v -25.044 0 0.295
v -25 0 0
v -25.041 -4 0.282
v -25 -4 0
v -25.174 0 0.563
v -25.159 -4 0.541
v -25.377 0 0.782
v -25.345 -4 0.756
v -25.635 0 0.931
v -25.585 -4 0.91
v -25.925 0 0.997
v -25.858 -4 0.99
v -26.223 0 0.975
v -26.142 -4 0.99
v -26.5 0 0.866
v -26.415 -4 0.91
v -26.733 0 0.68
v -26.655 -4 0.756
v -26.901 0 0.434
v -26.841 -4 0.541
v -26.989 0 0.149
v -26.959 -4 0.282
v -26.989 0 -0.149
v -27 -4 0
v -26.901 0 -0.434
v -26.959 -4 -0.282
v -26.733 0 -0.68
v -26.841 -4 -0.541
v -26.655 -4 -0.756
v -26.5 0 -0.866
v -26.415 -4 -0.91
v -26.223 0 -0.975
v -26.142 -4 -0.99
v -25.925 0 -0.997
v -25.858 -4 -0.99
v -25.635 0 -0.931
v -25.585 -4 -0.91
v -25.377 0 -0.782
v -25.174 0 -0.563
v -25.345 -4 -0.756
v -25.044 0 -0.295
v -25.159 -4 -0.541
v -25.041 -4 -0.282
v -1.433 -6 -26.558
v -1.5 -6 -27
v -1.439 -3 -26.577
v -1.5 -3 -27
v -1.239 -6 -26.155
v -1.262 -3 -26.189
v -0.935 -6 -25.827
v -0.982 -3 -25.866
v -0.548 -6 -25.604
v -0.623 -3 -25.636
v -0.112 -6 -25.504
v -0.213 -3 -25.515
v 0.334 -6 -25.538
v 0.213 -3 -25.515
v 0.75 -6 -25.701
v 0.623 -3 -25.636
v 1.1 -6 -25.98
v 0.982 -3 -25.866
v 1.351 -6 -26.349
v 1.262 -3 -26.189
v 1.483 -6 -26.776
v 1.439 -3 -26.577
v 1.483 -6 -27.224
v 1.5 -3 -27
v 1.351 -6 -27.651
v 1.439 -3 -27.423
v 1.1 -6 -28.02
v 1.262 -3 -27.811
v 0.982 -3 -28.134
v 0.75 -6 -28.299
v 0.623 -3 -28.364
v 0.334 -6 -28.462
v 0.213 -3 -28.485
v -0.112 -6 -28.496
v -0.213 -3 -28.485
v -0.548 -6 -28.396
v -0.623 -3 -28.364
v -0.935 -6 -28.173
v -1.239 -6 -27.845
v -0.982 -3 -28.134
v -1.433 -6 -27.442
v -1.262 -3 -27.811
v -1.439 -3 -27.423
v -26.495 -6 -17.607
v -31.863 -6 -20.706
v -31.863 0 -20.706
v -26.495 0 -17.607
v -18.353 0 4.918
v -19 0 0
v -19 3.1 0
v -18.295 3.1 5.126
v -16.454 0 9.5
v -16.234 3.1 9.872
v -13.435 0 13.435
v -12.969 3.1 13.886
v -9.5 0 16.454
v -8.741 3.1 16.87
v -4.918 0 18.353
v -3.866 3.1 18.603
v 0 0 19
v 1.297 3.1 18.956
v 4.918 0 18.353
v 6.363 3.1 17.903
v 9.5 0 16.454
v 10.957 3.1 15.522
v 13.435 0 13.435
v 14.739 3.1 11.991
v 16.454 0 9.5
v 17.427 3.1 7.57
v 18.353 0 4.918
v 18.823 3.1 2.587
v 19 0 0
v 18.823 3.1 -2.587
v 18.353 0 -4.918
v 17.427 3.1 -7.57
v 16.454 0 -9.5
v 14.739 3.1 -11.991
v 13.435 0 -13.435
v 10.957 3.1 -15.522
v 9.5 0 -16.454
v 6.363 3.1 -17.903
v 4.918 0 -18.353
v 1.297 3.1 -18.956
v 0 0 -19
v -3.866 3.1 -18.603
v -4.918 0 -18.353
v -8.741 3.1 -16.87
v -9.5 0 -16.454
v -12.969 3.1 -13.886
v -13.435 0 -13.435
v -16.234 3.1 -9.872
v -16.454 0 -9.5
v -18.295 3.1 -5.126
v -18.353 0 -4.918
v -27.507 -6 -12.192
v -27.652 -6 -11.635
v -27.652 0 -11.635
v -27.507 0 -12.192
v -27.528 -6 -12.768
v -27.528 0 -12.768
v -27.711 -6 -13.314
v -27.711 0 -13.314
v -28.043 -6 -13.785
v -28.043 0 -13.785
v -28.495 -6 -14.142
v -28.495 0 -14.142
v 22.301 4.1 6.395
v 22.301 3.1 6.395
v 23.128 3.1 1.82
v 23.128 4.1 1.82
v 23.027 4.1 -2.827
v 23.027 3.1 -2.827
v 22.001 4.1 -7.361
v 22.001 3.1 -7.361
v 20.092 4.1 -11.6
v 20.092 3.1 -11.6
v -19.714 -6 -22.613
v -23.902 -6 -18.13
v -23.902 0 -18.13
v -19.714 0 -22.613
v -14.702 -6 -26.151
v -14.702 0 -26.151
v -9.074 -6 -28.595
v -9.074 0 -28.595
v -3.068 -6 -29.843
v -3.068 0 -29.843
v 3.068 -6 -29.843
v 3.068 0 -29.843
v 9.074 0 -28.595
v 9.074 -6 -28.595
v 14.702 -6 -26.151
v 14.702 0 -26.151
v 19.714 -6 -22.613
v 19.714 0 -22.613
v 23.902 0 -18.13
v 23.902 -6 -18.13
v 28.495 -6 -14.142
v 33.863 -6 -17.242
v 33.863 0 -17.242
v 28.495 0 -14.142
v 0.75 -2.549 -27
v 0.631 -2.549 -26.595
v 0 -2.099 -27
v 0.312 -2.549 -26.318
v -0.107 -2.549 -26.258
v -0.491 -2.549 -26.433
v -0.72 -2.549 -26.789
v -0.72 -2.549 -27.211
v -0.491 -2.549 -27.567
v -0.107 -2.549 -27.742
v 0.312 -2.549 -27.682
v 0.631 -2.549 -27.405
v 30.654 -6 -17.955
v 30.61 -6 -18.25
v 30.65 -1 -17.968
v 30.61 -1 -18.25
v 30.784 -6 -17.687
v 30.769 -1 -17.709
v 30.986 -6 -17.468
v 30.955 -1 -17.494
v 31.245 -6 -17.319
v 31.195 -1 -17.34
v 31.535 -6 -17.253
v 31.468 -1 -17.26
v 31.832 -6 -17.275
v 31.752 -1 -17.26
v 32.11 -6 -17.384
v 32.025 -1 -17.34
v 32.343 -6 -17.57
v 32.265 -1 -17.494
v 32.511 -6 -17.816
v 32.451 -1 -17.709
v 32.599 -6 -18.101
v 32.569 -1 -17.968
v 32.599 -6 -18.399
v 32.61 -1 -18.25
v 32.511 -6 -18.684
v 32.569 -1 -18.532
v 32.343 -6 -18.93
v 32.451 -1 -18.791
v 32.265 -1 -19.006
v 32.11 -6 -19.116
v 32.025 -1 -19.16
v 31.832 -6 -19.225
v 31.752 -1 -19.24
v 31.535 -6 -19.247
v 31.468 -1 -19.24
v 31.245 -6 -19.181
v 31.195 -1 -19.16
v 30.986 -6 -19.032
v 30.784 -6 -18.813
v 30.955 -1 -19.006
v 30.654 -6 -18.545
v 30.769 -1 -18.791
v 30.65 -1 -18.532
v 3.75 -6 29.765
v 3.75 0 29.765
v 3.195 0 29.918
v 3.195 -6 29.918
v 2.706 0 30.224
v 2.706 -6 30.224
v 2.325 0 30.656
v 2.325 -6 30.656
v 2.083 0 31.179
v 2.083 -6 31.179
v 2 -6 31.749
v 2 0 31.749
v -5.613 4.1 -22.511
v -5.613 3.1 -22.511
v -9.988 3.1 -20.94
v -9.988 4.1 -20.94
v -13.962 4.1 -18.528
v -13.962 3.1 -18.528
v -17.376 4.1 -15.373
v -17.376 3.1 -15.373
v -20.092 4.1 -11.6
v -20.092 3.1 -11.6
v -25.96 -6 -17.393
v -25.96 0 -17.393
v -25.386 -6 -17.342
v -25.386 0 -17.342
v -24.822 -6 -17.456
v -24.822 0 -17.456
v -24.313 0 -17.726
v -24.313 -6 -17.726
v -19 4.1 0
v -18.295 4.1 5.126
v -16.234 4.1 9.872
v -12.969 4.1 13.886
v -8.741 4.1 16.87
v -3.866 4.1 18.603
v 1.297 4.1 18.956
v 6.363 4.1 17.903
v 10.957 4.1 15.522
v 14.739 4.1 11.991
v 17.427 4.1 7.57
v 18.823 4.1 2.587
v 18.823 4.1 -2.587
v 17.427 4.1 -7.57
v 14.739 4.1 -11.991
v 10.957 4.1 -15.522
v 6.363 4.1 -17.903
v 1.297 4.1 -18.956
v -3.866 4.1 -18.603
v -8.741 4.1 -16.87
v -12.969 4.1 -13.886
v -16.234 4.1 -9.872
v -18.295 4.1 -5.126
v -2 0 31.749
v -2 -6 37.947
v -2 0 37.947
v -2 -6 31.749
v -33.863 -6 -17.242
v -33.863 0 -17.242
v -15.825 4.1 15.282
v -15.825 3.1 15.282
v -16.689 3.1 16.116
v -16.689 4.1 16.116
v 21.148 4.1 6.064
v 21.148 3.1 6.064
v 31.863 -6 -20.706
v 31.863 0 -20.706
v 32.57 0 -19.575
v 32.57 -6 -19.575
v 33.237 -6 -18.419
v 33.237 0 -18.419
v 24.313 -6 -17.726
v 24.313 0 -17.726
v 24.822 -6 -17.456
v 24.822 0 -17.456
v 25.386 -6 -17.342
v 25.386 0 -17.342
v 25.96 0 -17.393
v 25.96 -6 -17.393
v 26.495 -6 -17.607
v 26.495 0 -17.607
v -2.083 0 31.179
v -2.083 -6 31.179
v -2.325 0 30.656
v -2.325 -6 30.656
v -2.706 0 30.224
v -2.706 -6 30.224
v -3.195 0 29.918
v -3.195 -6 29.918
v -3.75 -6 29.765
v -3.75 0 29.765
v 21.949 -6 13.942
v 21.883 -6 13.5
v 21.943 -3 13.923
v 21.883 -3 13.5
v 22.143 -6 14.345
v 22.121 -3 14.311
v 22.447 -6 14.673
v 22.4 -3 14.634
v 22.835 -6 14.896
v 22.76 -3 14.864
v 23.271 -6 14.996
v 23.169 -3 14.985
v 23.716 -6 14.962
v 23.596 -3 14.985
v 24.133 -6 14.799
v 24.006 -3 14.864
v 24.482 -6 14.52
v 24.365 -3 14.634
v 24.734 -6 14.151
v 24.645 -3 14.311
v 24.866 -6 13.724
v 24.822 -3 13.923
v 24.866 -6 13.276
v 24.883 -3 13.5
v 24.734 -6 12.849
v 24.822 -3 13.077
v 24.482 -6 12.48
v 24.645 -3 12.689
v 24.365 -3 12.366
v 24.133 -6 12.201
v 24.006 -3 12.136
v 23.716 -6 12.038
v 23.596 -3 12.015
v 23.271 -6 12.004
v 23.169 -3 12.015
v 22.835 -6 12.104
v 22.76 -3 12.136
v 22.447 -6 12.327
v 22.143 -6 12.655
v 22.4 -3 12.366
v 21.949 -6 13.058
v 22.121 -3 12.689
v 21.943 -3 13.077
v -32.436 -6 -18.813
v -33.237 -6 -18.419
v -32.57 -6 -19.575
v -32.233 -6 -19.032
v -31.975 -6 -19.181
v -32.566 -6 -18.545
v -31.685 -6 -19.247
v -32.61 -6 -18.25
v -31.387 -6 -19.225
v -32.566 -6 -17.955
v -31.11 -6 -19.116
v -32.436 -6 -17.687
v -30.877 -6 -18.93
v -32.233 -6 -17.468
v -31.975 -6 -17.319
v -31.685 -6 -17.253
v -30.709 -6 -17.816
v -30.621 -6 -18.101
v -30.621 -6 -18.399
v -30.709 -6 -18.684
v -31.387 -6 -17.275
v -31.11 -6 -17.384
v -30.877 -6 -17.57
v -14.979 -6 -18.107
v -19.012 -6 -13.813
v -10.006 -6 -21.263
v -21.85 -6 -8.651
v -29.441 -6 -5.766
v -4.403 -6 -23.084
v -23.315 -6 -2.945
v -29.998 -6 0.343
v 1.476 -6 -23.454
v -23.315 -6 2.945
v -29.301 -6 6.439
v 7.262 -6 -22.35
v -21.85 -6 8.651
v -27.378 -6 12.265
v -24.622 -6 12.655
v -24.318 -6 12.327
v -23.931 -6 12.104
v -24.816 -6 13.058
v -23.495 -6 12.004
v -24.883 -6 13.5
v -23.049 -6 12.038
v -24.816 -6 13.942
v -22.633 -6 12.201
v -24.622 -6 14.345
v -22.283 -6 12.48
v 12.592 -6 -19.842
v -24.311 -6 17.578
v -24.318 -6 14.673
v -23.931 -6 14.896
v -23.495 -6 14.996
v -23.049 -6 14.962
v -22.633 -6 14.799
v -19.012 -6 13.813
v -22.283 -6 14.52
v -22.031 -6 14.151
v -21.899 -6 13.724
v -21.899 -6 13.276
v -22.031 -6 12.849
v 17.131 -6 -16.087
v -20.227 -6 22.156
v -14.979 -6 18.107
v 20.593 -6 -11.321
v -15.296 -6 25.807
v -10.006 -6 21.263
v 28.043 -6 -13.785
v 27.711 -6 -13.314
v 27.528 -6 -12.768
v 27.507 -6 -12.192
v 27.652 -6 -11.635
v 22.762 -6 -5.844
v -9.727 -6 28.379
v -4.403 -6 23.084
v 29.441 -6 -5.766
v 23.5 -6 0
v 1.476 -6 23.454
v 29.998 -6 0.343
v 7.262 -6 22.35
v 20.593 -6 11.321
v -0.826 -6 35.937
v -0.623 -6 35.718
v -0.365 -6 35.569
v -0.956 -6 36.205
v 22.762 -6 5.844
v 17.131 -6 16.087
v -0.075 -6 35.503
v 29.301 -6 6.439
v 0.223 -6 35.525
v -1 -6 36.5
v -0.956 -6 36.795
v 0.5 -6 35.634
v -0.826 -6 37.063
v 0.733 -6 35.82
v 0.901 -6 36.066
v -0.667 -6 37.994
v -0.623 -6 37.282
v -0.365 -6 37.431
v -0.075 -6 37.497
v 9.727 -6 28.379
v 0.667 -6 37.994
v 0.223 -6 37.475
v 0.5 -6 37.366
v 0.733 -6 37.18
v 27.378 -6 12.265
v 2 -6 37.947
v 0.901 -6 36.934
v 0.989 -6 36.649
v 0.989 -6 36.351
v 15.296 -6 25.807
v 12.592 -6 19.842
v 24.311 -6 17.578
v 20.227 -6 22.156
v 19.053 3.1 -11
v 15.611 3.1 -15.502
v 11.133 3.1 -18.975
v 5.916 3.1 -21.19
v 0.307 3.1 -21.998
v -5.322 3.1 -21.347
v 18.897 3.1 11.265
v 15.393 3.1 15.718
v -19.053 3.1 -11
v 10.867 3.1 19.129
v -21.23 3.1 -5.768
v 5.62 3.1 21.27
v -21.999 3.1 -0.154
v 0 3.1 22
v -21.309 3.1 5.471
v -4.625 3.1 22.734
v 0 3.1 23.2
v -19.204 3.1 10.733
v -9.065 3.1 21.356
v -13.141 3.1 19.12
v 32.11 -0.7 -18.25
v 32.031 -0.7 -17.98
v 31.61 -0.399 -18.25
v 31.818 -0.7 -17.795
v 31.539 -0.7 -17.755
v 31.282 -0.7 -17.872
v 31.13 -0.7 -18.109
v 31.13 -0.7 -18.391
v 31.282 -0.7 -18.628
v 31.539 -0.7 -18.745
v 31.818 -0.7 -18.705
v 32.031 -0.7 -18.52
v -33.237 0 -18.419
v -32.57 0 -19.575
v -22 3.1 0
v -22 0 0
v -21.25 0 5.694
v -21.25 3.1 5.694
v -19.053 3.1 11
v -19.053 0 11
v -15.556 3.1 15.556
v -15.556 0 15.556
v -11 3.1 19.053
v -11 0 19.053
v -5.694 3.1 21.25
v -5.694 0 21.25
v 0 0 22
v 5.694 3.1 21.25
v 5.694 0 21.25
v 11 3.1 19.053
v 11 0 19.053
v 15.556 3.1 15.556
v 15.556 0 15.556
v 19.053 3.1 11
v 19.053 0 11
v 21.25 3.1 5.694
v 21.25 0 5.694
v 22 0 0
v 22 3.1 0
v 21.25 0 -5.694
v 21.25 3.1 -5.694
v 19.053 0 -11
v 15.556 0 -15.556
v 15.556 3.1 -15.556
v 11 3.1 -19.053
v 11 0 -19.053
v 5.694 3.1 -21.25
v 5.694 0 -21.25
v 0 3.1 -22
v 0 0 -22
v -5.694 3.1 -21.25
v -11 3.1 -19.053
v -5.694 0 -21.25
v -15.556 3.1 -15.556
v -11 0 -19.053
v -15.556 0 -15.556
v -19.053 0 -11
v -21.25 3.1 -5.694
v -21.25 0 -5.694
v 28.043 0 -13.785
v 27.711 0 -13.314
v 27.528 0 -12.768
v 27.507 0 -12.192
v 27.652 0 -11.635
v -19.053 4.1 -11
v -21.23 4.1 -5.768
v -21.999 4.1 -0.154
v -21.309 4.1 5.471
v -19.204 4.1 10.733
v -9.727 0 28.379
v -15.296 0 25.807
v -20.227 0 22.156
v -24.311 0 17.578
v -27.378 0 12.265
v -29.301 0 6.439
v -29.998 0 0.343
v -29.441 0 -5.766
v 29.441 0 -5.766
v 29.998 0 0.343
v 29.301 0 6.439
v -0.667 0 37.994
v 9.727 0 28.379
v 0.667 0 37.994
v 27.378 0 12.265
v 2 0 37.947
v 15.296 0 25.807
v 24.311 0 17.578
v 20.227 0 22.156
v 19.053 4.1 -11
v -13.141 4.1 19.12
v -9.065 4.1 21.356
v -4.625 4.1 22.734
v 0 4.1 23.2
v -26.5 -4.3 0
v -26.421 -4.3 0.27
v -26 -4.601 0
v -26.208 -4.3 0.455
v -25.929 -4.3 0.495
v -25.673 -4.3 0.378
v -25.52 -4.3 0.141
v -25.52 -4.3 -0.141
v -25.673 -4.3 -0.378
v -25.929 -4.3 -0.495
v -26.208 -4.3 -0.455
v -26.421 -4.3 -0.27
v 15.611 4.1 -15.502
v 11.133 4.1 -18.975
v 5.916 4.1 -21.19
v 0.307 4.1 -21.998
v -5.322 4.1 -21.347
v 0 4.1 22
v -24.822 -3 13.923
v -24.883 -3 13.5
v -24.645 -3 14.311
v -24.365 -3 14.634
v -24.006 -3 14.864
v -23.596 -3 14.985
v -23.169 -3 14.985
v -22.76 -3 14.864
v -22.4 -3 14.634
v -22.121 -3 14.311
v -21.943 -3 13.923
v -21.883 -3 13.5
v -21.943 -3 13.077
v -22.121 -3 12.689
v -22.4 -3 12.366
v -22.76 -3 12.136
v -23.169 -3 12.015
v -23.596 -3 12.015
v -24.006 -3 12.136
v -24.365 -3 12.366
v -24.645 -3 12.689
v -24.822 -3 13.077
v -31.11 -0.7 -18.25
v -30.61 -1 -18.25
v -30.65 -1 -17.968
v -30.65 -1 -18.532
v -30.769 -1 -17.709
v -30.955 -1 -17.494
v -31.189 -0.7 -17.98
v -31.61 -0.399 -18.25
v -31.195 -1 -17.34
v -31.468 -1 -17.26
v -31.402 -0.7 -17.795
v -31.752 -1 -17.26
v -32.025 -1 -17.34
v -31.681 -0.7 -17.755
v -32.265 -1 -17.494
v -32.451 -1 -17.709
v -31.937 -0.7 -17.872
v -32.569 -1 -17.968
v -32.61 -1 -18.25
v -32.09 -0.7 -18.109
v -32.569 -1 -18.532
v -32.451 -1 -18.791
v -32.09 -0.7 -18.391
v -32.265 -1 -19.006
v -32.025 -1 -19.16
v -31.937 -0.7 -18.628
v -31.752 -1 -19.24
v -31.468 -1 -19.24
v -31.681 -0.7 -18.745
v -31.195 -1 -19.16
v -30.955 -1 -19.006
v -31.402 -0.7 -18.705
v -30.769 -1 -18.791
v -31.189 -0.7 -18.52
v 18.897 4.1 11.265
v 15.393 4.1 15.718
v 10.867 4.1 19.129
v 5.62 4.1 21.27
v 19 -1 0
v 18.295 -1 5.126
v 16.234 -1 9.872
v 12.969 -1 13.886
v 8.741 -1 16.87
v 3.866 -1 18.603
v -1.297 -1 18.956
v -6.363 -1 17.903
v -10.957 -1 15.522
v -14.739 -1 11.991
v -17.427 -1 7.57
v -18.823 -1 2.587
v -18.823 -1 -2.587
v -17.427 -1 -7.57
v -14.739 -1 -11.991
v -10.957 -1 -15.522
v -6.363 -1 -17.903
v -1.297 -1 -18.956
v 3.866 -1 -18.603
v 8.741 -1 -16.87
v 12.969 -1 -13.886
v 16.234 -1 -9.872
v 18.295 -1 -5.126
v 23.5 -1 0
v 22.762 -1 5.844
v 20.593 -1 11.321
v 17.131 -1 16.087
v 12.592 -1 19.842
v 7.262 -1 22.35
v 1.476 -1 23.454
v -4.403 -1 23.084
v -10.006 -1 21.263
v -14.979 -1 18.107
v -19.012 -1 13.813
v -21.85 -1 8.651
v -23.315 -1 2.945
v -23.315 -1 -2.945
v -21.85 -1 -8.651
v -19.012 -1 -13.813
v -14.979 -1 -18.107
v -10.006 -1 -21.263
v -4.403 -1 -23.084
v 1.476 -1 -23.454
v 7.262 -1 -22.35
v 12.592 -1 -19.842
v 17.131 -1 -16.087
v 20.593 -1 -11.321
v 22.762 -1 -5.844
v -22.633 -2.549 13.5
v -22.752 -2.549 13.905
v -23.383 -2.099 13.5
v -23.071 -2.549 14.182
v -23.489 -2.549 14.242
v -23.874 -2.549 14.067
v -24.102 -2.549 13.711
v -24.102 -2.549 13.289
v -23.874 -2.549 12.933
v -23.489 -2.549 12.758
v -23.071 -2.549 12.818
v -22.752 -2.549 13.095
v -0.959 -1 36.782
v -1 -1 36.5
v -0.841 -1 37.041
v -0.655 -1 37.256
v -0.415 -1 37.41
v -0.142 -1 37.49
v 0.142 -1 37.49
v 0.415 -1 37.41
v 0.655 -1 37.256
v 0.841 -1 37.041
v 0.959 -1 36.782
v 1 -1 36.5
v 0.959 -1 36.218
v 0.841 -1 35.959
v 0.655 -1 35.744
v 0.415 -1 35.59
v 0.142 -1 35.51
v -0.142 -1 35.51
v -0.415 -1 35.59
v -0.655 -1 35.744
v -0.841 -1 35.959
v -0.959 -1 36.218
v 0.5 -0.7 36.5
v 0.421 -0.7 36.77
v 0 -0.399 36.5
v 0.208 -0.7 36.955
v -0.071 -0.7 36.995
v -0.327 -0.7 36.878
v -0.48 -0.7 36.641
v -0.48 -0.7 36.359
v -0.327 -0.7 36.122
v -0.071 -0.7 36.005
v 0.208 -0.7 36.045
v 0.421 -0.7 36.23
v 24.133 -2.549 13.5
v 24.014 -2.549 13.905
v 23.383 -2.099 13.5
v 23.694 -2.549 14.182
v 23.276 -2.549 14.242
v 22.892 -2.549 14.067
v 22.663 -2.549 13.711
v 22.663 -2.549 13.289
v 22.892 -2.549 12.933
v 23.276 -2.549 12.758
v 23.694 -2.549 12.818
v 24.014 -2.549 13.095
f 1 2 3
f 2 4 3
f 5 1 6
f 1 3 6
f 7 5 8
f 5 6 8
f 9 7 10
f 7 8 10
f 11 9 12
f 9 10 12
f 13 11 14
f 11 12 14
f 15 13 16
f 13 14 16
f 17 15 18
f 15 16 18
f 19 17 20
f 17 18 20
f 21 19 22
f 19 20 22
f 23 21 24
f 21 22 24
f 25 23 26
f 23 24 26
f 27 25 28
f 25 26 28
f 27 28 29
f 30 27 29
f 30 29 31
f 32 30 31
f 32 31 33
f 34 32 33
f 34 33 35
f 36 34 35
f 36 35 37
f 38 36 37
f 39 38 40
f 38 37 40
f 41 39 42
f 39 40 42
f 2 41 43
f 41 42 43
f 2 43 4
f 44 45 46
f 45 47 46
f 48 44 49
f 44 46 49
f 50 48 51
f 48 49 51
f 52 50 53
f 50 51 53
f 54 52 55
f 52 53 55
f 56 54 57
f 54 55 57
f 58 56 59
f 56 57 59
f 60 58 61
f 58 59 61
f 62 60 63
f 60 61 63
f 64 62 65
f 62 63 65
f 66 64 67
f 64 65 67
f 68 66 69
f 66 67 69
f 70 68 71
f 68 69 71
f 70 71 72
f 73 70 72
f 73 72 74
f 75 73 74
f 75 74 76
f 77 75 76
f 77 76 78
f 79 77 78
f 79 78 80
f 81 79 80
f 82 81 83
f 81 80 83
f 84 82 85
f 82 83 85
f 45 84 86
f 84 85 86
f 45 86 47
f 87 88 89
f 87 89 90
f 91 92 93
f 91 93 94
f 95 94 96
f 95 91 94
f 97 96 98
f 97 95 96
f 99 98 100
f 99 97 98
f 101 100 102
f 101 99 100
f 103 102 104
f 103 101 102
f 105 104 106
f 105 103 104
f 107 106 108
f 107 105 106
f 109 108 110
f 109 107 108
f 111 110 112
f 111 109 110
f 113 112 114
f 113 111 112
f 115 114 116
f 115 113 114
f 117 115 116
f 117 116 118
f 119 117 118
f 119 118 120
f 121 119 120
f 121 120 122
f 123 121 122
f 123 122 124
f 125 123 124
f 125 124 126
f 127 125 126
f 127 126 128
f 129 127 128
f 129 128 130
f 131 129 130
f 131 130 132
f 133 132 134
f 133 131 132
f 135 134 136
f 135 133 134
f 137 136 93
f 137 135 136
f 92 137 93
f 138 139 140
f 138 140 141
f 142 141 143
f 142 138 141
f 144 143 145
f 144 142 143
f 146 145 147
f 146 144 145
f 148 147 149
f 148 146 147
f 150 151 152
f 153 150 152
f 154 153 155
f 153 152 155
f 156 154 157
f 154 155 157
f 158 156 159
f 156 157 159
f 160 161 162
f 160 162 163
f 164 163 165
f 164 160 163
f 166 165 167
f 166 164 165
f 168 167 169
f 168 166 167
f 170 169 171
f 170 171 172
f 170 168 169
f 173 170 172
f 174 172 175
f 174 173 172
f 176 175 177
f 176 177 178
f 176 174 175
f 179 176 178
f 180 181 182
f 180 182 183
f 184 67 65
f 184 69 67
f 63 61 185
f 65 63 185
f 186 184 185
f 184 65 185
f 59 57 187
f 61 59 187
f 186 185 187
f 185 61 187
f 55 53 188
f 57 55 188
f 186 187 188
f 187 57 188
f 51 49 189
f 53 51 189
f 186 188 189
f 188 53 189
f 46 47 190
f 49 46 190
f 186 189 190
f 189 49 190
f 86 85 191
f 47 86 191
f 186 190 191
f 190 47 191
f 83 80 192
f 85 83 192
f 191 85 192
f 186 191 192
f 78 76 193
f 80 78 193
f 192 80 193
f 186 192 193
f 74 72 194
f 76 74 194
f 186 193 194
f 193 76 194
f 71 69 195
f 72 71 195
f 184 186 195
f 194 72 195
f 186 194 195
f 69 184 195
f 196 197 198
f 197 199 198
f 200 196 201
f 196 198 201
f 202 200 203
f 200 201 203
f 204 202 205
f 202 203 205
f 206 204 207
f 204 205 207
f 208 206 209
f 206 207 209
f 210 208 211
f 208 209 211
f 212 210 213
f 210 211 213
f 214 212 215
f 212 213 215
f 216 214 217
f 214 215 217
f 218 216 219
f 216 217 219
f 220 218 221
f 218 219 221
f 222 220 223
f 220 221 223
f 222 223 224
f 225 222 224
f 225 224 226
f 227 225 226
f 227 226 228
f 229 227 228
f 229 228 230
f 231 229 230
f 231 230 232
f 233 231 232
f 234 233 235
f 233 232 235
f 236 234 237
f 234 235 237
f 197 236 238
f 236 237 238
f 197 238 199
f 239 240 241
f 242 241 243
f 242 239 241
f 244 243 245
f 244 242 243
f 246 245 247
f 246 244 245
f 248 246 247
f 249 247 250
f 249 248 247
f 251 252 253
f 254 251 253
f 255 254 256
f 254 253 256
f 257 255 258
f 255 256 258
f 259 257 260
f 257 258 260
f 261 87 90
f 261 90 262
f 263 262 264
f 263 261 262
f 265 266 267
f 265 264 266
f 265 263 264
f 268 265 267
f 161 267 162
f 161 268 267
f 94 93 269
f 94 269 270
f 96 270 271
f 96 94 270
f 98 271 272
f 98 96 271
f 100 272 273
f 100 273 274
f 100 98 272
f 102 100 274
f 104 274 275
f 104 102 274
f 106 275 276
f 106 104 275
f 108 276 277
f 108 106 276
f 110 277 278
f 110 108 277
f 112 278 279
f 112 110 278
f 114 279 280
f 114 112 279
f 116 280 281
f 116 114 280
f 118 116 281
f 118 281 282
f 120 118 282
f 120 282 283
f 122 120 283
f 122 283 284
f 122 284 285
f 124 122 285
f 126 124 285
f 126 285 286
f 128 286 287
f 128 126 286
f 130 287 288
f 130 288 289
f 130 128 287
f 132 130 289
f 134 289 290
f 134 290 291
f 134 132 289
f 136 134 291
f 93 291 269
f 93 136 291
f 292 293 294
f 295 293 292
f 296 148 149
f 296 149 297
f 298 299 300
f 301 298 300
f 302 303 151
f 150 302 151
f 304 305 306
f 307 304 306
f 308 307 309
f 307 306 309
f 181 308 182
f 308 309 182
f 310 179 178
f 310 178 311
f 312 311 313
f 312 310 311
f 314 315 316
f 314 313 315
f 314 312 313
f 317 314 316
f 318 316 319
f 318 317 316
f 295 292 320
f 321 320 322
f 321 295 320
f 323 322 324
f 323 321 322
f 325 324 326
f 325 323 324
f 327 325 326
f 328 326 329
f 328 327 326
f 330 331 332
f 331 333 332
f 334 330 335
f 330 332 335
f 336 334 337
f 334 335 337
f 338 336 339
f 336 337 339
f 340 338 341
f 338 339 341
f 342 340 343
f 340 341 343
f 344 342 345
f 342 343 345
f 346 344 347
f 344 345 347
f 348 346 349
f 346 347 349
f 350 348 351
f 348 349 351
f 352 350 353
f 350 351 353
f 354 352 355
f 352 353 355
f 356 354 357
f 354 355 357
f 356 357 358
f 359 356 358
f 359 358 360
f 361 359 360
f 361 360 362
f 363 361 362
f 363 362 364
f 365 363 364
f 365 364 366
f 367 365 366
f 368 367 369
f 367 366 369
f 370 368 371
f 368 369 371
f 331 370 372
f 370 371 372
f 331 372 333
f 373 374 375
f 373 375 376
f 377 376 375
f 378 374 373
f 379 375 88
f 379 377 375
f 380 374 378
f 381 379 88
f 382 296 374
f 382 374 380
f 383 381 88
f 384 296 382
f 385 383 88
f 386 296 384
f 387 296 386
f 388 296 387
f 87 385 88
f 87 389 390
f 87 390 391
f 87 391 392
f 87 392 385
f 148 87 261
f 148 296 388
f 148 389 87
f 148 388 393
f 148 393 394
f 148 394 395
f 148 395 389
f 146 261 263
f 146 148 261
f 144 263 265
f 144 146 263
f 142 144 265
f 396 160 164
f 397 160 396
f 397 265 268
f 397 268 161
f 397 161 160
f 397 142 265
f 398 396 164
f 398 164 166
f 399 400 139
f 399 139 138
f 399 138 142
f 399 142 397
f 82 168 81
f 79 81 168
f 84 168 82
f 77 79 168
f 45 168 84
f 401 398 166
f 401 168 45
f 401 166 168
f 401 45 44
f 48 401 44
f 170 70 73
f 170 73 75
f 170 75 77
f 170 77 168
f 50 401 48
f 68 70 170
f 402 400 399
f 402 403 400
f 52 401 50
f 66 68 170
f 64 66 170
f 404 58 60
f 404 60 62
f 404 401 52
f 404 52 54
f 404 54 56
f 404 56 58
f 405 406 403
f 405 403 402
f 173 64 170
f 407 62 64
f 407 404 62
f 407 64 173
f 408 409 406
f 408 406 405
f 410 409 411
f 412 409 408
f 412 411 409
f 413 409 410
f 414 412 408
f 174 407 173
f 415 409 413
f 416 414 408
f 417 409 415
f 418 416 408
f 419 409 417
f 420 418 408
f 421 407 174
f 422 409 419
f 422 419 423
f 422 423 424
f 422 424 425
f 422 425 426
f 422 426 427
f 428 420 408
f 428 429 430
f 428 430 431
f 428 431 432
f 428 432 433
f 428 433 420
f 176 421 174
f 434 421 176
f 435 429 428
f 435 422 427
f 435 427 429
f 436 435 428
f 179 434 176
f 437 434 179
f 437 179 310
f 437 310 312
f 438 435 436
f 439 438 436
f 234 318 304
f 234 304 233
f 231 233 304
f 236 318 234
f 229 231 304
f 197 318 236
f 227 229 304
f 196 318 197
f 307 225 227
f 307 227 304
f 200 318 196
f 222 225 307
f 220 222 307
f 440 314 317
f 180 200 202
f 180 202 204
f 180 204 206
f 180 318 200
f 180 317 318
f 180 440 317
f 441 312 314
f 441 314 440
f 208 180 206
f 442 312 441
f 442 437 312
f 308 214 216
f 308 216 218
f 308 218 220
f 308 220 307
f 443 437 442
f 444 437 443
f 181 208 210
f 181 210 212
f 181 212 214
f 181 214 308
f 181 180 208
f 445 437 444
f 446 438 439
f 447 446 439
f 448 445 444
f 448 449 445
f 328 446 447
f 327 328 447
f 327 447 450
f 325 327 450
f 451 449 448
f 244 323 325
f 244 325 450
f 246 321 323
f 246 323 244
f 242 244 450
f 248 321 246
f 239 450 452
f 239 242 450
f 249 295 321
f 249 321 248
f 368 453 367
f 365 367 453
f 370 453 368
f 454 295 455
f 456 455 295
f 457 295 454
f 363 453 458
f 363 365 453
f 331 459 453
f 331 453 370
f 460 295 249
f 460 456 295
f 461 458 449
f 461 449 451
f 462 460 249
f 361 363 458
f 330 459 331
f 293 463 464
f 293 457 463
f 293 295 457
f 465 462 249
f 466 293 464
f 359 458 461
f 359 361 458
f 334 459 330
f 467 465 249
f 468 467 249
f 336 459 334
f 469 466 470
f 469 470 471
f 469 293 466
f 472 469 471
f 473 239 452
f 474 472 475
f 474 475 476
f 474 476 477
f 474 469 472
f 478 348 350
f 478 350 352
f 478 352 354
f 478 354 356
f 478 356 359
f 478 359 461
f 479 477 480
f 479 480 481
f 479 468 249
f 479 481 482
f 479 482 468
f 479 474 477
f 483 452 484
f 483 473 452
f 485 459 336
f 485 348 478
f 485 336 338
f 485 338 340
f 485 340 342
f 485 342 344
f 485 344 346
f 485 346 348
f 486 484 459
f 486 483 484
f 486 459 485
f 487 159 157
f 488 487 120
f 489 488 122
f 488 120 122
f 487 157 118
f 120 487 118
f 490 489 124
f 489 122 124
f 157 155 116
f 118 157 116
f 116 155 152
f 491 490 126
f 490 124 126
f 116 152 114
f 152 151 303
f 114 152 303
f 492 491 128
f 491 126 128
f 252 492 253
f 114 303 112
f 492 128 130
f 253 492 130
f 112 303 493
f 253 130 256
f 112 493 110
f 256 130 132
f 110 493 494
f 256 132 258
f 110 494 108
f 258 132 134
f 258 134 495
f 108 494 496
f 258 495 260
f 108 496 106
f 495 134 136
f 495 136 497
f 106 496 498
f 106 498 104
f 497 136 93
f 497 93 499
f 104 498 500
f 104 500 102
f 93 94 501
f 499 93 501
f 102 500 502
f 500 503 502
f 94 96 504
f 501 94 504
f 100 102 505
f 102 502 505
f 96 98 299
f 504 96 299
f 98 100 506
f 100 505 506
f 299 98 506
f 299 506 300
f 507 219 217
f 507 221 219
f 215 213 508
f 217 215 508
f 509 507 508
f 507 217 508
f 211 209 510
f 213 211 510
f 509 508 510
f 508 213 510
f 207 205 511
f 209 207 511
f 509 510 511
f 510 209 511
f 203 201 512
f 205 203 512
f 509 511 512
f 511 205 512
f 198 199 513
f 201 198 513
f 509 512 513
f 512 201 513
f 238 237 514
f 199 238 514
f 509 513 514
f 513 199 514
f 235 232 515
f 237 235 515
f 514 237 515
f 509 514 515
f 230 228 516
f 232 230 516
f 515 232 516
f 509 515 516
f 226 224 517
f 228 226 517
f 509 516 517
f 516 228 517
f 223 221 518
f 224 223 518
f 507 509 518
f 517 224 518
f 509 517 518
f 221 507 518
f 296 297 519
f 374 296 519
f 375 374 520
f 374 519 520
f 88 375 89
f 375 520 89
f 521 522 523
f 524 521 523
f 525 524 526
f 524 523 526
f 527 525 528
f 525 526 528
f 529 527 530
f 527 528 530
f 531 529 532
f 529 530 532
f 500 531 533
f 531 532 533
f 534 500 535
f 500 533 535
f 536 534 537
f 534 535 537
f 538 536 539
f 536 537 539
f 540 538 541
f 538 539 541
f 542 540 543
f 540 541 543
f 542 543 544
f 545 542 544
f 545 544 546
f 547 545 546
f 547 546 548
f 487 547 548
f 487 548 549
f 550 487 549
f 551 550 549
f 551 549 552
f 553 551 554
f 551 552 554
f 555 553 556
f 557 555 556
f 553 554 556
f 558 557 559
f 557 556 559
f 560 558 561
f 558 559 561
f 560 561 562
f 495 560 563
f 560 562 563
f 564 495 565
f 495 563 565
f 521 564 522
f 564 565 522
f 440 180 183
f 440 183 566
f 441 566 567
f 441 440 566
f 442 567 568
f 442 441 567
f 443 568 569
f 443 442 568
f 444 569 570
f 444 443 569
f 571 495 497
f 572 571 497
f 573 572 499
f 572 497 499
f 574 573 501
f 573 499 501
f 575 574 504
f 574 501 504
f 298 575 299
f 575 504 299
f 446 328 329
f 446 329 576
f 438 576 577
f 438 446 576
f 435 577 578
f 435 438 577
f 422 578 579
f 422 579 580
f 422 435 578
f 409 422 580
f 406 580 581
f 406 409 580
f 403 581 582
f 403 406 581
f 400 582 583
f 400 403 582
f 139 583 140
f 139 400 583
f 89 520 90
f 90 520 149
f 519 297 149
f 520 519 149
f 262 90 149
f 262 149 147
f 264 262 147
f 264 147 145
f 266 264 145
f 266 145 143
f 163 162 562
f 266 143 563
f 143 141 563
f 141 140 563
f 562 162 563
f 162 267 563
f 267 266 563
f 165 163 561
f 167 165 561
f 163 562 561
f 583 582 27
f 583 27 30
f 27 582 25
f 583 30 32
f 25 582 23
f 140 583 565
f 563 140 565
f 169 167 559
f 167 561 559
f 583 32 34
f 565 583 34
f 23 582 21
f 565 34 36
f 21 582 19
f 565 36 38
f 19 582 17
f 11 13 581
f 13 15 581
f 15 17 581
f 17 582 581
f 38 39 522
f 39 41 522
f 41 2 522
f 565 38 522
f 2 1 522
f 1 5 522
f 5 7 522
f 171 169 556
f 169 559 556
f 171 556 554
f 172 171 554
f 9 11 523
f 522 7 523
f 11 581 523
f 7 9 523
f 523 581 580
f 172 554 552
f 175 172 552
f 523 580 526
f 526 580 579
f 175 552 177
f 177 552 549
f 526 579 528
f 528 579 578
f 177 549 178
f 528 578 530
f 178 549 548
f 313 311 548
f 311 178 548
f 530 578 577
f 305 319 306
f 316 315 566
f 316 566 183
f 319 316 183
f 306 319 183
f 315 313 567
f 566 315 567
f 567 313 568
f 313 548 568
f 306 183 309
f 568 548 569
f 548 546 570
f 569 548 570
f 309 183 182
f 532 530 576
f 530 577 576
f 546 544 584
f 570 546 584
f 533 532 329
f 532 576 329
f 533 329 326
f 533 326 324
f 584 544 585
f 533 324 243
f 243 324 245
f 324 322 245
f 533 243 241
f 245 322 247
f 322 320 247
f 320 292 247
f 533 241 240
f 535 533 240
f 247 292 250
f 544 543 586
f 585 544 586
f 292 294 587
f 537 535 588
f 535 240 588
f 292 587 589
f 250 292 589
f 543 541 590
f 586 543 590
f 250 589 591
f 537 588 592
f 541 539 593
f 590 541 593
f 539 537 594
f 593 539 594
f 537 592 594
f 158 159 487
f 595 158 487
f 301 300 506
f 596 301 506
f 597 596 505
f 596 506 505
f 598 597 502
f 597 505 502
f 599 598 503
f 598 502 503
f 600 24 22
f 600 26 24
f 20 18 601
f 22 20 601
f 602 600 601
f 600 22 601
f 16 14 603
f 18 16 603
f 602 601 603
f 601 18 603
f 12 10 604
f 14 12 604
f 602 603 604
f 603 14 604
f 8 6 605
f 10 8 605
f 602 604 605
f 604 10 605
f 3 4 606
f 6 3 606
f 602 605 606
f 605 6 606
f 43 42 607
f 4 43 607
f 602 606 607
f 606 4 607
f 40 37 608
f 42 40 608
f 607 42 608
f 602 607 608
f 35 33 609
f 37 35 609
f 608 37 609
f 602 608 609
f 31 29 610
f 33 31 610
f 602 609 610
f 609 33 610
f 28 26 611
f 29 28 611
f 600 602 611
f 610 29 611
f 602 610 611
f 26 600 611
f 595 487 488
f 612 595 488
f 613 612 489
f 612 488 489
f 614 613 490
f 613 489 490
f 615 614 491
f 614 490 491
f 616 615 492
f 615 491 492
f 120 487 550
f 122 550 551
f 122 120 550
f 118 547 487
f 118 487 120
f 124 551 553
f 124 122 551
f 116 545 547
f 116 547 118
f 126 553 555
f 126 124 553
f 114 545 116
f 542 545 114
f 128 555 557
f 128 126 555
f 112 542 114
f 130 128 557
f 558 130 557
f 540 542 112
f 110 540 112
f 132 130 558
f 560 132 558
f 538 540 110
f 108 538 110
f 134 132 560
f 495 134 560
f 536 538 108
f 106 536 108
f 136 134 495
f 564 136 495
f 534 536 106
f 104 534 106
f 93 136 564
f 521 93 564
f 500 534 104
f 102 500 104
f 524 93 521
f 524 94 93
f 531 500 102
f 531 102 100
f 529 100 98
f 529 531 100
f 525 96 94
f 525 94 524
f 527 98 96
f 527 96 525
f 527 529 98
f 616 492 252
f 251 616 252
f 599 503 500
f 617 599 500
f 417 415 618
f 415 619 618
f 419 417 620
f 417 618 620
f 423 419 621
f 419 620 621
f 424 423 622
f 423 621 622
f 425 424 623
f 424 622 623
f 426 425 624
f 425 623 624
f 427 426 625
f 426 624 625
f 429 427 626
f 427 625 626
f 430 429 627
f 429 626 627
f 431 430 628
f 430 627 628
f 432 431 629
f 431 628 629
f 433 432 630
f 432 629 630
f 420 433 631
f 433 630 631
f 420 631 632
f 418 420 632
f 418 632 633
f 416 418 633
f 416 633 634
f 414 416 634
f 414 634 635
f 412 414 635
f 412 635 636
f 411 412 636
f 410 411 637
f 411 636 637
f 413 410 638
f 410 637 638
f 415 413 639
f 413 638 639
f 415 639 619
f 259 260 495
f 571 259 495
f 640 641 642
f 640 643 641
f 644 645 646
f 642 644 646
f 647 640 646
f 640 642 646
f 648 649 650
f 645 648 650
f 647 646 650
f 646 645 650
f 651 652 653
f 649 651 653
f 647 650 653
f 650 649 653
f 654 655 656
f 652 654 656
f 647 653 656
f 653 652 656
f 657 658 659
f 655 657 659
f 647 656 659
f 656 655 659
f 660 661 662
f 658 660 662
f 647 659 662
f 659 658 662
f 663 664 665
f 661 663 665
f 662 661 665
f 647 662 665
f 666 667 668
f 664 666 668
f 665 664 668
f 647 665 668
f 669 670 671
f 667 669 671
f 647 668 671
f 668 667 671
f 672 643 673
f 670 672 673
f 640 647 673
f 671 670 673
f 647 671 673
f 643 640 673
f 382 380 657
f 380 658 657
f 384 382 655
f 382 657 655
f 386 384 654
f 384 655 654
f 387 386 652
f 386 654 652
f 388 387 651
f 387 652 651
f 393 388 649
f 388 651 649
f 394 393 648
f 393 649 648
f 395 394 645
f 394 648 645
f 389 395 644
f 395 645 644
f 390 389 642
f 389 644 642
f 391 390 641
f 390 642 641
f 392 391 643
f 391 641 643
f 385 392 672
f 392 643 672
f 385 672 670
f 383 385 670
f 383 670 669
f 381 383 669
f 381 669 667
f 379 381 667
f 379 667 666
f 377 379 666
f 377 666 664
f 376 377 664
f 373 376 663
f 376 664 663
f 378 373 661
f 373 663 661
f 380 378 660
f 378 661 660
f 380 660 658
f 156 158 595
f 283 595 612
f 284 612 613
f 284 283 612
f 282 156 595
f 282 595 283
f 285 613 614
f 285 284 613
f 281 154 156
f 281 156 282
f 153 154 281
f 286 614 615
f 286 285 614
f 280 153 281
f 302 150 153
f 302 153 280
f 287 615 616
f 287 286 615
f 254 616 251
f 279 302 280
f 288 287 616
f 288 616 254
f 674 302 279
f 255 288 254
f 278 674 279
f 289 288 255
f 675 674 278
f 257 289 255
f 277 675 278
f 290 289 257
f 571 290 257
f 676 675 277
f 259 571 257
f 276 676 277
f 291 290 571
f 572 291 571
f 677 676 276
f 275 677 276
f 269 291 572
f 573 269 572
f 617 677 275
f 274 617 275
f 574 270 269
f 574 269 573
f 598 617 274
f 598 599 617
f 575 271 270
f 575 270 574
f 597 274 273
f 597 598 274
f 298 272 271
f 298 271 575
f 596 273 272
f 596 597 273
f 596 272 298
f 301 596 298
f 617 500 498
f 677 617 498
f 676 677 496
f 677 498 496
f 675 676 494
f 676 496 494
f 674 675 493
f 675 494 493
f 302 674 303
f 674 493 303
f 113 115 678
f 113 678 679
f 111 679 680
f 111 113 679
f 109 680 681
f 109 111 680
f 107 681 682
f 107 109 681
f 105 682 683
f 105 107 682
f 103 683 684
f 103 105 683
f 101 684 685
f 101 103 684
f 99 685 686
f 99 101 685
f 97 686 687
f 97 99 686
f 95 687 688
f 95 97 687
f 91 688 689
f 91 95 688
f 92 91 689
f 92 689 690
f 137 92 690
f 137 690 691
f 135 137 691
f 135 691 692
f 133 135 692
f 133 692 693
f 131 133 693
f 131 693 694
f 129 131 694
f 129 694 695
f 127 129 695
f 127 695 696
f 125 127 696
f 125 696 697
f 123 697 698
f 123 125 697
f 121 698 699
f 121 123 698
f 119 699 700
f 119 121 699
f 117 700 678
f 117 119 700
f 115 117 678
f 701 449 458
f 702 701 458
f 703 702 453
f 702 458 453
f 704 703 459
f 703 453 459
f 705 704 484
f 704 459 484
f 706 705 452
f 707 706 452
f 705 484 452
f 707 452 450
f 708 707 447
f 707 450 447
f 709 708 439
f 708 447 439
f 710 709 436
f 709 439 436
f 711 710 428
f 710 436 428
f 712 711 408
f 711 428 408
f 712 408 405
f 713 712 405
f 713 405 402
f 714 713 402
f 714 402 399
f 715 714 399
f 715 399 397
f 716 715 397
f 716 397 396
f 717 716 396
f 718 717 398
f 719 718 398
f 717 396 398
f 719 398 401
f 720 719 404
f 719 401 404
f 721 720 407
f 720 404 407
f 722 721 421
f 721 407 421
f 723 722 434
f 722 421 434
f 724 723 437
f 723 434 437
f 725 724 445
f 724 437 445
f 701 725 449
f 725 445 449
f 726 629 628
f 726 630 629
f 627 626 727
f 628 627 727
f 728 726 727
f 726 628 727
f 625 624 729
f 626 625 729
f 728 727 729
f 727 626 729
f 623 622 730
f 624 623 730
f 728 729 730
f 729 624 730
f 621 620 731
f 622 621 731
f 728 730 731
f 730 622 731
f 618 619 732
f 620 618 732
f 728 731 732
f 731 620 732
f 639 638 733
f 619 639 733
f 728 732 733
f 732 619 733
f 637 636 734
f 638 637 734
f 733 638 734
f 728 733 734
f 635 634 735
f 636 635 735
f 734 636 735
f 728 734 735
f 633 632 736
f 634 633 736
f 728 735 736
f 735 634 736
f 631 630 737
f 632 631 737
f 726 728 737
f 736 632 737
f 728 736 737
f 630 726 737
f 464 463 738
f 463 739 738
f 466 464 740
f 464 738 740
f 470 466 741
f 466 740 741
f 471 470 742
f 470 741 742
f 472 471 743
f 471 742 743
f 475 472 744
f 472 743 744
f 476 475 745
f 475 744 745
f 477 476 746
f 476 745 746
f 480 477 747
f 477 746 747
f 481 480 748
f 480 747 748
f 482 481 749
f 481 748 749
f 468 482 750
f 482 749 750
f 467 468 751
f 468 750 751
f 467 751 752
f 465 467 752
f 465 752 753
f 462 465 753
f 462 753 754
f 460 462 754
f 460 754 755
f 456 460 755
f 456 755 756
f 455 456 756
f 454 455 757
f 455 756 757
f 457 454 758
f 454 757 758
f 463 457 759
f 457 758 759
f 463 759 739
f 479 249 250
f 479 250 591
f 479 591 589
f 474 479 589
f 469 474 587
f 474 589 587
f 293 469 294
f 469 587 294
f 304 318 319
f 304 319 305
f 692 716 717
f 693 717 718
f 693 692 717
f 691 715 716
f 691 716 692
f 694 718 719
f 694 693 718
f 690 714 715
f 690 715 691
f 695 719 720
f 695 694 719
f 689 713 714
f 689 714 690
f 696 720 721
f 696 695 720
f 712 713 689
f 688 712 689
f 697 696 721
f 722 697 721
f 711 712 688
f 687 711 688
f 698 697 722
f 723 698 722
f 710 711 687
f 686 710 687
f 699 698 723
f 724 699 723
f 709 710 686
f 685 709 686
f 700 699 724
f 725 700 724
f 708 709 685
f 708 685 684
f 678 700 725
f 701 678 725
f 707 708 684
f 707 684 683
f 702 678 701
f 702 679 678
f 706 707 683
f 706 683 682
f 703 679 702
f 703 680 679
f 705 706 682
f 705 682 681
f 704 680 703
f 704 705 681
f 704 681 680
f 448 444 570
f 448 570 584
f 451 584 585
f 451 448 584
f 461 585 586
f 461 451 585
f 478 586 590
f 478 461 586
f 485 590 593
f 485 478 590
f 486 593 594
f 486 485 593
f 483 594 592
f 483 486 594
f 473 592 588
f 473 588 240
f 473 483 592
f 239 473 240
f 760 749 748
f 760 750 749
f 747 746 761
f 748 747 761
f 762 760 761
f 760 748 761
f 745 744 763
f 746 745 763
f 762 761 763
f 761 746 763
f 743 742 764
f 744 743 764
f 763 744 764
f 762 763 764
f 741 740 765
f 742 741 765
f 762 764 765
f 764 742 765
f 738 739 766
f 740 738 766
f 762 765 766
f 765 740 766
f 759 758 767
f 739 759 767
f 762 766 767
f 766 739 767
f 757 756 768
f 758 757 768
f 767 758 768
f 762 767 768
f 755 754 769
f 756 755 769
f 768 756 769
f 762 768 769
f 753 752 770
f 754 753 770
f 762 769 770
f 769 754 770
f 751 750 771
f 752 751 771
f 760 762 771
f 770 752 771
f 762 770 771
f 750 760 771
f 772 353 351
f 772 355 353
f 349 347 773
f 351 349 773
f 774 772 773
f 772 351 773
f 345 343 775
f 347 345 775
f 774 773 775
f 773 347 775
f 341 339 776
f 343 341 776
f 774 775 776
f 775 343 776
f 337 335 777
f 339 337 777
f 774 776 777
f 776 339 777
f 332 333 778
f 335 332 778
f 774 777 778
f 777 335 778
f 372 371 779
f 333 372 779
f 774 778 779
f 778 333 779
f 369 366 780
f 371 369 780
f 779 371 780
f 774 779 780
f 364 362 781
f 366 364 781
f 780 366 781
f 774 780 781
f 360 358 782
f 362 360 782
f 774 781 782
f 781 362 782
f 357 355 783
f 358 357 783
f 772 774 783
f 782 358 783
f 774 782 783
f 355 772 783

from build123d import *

# Parameters (mm, degrees)
F0_R      = 38
F0_R_2    = 19
F1_DEPTH  = 6
F2_R      = 22
F2_R_2    = 19
F3_DEPTH  = 3.1
F4_R      = 19
F5_DEPTH  = 1
F7_D      = 2
F7_DEPTH  = 4
F7_TIP    = 0.600860619
F9_D      = 3
F9_DEPTH  = 3
F9_TIP    = 0.9012909285
F10_D     = 2
F10_DEPTH = 5
F10_TIP   = 0.600860619
F12_DEPTH = 10.101
F13_R     = 23.5
F14_DEPTH = 5


with BuildPart() as f1:
    # F0 (on Front) → F1 (new body)
    with BuildSketch(Plane.XZ):
        Circle(F0_R)
        Circle(F0_R_2, mode=Mode.SUBTRACT)
    extrude(amount=F1_DEPTH)

    # F2 (on face) → F3 (join)
    with BuildSketch(Plane(origin=(0, 0, 0), x_dir=(-1, 0, 0), z_dir=(0, 1, 0))):
        Circle(F2_R)
        Circle(F2_R_2, mode=Mode.SUBTRACT)
    extrude(amount=F3_DEPTH)

    # F7
    with Locations(Plane(origin=(0, 0, 0), x_dir=(-1, 0, 0), z_dir=(0, 1, 0))):
        with Locations((26, 0)):
            Hole(F7_D / 2, depth=F7_DEPTH)
            with Locations((0, 0, -(F7_DEPTH + F7_TIP / 2))):  # 118° drill point
                Cone(0, F7_D / 2, F7_TIP, mode=Mode.SUBTRACT)

    # F9
    with Locations(Plane.XZ.offset(6)):
        with Locations((23.3826859022, 13.5), (-23.3826859022, 13.5), (0, -27)):
            Hole(F9_D / 2, depth=F9_DEPTH)
            with Locations((0, 0, -(F9_DEPTH + F9_TIP / 2))):  # 118° drill point
                Cone(0, F9_D / 2, F9_TIP, mode=Mode.SUBTRACT)

    # F10
    with Locations(Plane.XZ.offset(6)):
        with Locations((0, 36.5), (31.6099272381, -18.25), (-31.6099272381, -18.25)):
            Hole(F10_D / 2, depth=F10_DEPTH)
            with Locations((0, 0, -(F10_DEPTH + F10_TIP / 2))):  # 118° drill point
                Cone(0, F10_D / 2, F10_TIP, mode=Mode.SUBTRACT)


with BuildPart() as f5:
    # F4 (on face) → F5 (new body)
    with BuildSketch(Plane(origin=(0, 3.1, 0), x_dir=(-1, 0, 0), z_dir=(0, 1, 0))):
        with BuildLine():
            Line((-21.1477573106, 6.064021828), (-22.3012713458, 6.394786655))
            ThreePointArc((-22.3012713458, 6.394786655), (-23.0270707181, -2.827368767), (-20.0917893678, -11.6))
            Line((-20.0917893678, -11.6), (-19.0525588833, -11))
            ThreePointArc((-19.0525588833, -11), (-8.5960848268, -20.251106776), (5.3222817032, -21.3465059781))
            Line((5.3222817032, -21.3465059781), (5.6125879779, -22.5108608496))
            ThreePointArc((5.6125879779, -22.5108608496), (13.9621085371, -18.5283438331), (20.0917893678, -11.6))
            Line((20.0917893678, -11.6), (19.0525588833, -11))
            ThreePointArc((19.0525588833, -11), (21.8360153361, 2.6811255549), (15.8254756075, 15.2824841501))
            Line((15.8254756075, 15.2824841501), (16.6886833679, 16.1160741946))
            ThreePointArc((16.6886833679, 16.1160741946), (9.064962181, 21.3557126001), (0, 23.2))
            Line((0, 23.2), (0, 22))
            ThreePointArc((0, 22), (-13.2399305093, 17.569981221), (-21.1477573106, 6.064021828))
        make_face()
        Circle(F4_R, mode=Mode.SUBTRACT)
    extrude(amount=F5_DEPTH)


with BuildPart() as f12_tool:
    # F11 (on face) → F12 (new body, through all)
    with BuildSketch(Plane.XZ.offset(6)):
        with BuildLine():
            ThreePointArc((-2, 31.7490157328), (-2.5, 30.4261400772), (-3.75, 29.7647022495))
            ThreePointArc((-3.75, 29.7647022495), (-25.9807621135, 15), (-27.6519882841, -11.6347558605))
            ThreePointArc((-27.6519882841, -11.6347558605), (-27.599810246, -13.0480065292), (-28.4954541697, -14.1424570588))
            Line((-28.4954541697, -14.1424570588), (-33.8633534503, -17.2416151534))
            ThreePointArc((-33.8633534503, -17.2416151534), (-32.9089653438, -19), (-31.8633534503, -20.7057167686))
            Line((-31.8633534503, -20.7057167686), (-26.4954541697, -17.606558674))
            ThreePointArc((-26.4954541697, -17.606558674), (-25.099810246, -17.3781335481), (-23.9019882841, -18.1299463889))
            ThreePointArc((-23.9019882841, -18.1299463889), (0, -30), (23.9019882841, -18.1299463889))
            ThreePointArc((23.9019882841, -18.1299463889), (25.099810246, -17.3781335481), (26.4954541697, -17.606558674))
            Line((26.4954541697, -17.606558674), (31.8633534503, -20.7057167686))
            ThreePointArc((31.8633534503, -20.7057167686), (32.9089653438, -19), (33.8633534503, -17.2416151534))
            Line((33.8633534503, -17.2416151534), (28.4954541697, -14.1424570588))
            ThreePointArc((28.4954541697, -14.1424570588), (27.599810246, -13.0480065292), (27.6519882841, -11.6347558605))
            ThreePointArc((27.6519882841, -11.6347558605), (25.9807621135, 15), (3.75, 29.7647022495))
            ThreePointArc((3.75, 29.7647022495), (2.5, 30.4261400772), (2, 31.7490157328))
            Line((2, 31.7490157328), (2, 37.947331922))
            ThreePointArc((2, 37.947331922), (0, 38), (-2, 37.947331922))
            Line((-2, 37.947331922), (-2, 31.7490157328))
        make_face()
    extrude(amount=-F12_DEPTH)


with BuildPart() as f1_1:
    add(f1.part)

    # F12: intersect by f12_tool
    add(f12_tool.part, mode=Mode.INTERSECT)

    # F13 (on face) → F14 (cut)
    with BuildSketch(Plane.XZ.offset(6)):
        Circle(F13_R)
    extrude(amount=-F14_DEPTH, mode=Mode.SUBTRACT)


with BuildPart() as f5_1:
    add(f5.part)

    # F12: intersect by f12_tool
    add(f12_tool.part, mode=Mode.INTERSECT)


solid = Compound([f1_1.part, f5_1.part])
